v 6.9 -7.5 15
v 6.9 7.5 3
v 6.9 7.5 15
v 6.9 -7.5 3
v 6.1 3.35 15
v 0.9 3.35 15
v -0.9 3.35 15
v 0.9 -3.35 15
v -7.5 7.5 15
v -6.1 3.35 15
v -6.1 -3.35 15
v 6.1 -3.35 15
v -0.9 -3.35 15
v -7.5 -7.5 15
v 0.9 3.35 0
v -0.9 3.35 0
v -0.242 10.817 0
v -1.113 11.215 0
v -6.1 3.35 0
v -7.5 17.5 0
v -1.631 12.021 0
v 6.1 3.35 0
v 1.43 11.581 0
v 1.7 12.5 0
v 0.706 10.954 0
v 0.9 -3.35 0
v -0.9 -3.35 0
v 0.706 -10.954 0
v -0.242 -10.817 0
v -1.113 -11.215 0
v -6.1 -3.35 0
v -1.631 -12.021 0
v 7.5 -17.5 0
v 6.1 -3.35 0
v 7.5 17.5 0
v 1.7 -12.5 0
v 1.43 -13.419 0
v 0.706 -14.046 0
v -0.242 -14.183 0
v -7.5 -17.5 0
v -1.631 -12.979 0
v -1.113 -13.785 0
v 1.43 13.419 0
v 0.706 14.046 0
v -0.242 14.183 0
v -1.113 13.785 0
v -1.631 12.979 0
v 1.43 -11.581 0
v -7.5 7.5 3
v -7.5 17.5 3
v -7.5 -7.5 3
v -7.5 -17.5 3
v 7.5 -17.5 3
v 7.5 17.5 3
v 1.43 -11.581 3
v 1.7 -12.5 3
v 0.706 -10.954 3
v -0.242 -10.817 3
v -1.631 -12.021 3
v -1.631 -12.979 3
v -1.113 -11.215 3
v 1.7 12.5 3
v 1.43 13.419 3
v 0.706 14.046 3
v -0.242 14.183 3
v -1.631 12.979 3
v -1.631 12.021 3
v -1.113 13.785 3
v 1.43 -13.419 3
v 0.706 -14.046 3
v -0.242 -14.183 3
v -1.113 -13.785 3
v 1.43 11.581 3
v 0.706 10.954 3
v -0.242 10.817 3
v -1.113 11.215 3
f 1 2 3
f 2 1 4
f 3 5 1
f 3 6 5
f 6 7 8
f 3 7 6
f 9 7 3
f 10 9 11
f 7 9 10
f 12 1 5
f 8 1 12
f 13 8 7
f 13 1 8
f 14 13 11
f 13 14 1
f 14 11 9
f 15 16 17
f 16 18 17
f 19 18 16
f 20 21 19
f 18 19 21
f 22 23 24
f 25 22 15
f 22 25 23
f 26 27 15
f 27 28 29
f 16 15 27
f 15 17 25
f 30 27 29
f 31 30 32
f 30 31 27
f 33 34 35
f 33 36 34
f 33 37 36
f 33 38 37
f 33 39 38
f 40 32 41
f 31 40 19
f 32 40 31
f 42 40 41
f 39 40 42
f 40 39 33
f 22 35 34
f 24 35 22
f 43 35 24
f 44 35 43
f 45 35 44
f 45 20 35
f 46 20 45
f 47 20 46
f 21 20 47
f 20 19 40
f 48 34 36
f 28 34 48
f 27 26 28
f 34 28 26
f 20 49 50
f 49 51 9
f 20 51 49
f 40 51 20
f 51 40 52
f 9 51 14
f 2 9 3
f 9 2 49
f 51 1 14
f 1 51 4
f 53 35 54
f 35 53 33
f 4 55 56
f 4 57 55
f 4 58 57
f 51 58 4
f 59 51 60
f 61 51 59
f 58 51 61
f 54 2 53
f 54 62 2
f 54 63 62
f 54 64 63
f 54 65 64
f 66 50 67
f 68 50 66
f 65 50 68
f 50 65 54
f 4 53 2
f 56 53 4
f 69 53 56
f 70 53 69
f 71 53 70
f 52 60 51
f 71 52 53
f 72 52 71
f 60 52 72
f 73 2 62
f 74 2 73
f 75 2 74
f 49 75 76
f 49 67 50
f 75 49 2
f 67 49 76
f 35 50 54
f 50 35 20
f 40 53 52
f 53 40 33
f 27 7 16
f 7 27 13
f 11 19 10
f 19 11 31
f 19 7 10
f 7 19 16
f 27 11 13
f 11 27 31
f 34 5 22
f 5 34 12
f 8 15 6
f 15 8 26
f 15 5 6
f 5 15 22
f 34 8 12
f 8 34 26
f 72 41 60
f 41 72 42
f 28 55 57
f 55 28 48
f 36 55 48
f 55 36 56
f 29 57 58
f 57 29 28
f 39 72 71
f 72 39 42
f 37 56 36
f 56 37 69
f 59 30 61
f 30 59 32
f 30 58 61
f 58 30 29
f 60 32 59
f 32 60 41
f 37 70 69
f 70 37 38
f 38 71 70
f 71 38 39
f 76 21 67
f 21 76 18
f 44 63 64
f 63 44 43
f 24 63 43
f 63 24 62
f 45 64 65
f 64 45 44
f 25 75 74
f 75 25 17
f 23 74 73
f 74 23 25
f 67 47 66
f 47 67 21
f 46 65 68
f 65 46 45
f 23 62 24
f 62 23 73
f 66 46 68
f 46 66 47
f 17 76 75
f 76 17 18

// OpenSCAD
// file: holder.scad
include <config.scad>

holder_base_w=25;
holder_base_h=20;
holder_cylinder_d=23.3;
holder_cylinder_h=6+5+2+5+2;

module holder(){
    holder1();
    translate([0,0,holder_base_h+holder_cylinder_h-6])
        holder2();
    translate([0,0,holder_base_h+holder_cylinder_h-2-6-5])    
        holder3();
}

module holder1(){
    difference(){
        union(){
            //base
            translate([-holder_base_w/2,-holder_base_w/2,0])
                cube([holder_base_w,holder_base_w,holder_base_h]);
            
            //cylinder
            translate([0,0,holder_base_h-1])
                cylinder(h=holder_cylinder_h+1,d=holder_cylinder_d);
            //cylinder2
            translate([0,0,holder_base_h-1])
                cylinder(h=2+1,d=25);
        }   
        //motor hole
        translate([0,0,-1])
            cylinder(h=holder_base_h+holder_cylinder_h+2,d=5+play);
        for(r=[-90,30,150])
        rotate([0,0,r+90])        
        translate([0,0,holder_base_h+holder_cylinder_h-3])
        rotate([0,90,0]){        
            translate([0,0,0])
                cylinder(h=holder_base_h+holder_cylinder_h+2,d=3.2+play);
            translate([0,0,4]){
                rotate([0,0,30])
                    cylinder(h=M3_nut_h,r=M3_nut_d/2,$fn=6);        
                translate([-5,-M3_nut_d/2,0])
                    cube([5,M3_nut_d,M3_nut_h]);        
            }
        }

        //cable holes
        translate([-holder_cylinder_d/2,0,holder_base_h-3+1])
            cylinder(h=holder_cylinder_h+4,r=3);
        translate([-holder_cylinder_d/2+3,0,holder_base_h-3])
        rotate([0,-90,0])        
            cylinder(h=holder_base_w/2,r=3);
           

        //holes
        holes_w=15.24;
        for(dx=[-1,1])
        for(dy=[-1,1])
        translate([dx*holes_w/2,dy*holes_w/2,0]){
            translate([0,0,-1])
                cylinder(h=holder_base_h+2,d=3.2+play);
            translate([0,0,holder_base_h/2-M3_nut_h/2]){
                rotate([0,0,30])
                    cylinder(h=M3_nut_h,r=M3_nut_d/2,$fn=6);        
                translate([holder_base_w*(dx-1)/2,-M3_nut_d/2,0])
                    cube([holder_base_w,M3_nut_d,M3_nut_h]);        
            }
        }

    }
}
module holder2(){
  difference(){
     cylinder(h=6,d=27);
      
     translate([0,0,-1])
        cylinder(h=8+2,d=holder_cylinder_d+play);
    for(r=[-90,30,150])
    rotate([0,0,r+90])        
    translate([0,0,3])
    rotate([0,90,0])      
        translate([0,0,0])
            cylinder(h=holder_base_h+holder_cylinder_h+2,d=3.2+play);
  }
}
module holder3(){
  difference(){
     cylinder(h=2,d=27);
      
    translate([0,0,-1])
        cylinder(h=2+2,d=holder_cylinder_d+play);


  }
}

holder();
//holder1();
//holder2();
//holder3();
// file: config.scad
//General Settings
play=0.2; //to make fittings (add to some holes if nessesary)
//circle resolution 
$fa = 3;
$fs = 1;//0.5;

aluminum = [0.9, 0.9, 0.9];
steel = [0.8, 0.8, 0.9];
wood="BurlyWood";

//ISO/DIN Parts 
//Kugellager
kugellager_d=5+play;
kugellager_h=2.5+play;

//Mutter M2
M2_nut_d=4.38+2*play;
M2_nut_w=4+2*play;
M2_nut_h=1.6+2*play;

//Mutter M3
M3_nut_d=6.01+2*play;
M3_nut_w=5.5+2*play;
M3_nut_h=2.4+2*play;

//Mutter M4
M4_nut_d=7.66+2*play;
M4_nut_w=7+2*play;
M4_nut_h=3.2+2*play;

//Mutter M5
M5_nut_d=9.23+2*play;
M5_nut_w=8+2*play;
M5_nut_h=4+2*play;


//Mutter M8
M8_nut_d=14.38+2*play;
M8_nut_w=13+2*play;
M8_nut_h=6.8+2*play;

//LMXXUU Linear Ball Bearing
LMXXUU_d=19;
LMXXUU_l=29;

//Pully 2.5
band_w=5;
band_b=2;
band_outer_d=13;
//Ballbearing opposit for pully
band_bb_id=5;
band_bb_od=11;
band_bb_w=4;

//Bearing
B608Z_od=22+2*play;
B608Z_id=8+2*play;
B608Z_isd=13;
B608Z_h=7;

//Nema17
nema17_od=42.3;
nema17_id=22+2*play;
nema17_screw_d=31;
nema17_l=48;

//Nema17
nema23_id=38.1+2*play;
nema23_screw_d=47.14;
// main file
include <config.scad>

use <holder.scad>

brush_holder_d=51;

module debug(){
    translate([0,brush_holder_d,0])
    rotate([180,0,0])
    translate([0,0,-40-2])
        holder();
        

    for(i=[0,brush_holder_d])
    translate([0,i,-1])
    difference(){
        cube([50,50,2],true);
        for(i=[-1,1])
        translate([0,i*29/2,-2])
            cylinder(h=4,d=4.4);
    }
    //PCB
    translate([0,brush_holder_d,40+2])
    rotate(0){        
        translate([-50,-50,0])        
            cube([100,100,1.6]);
        translate([-5/2,-2/2-46,-27])        
            cube([5,2,27]);
    }
}

module brush(){
    brush1();
    translate([0,brush_holder_d-15-26/2-2,14])
    rotate([-90,90,0])
        brush2();
}

module brush1(){
    difference(){
        union(){
            translate([-35/2,brush_holder_d-15-26/2-2-5,0])
                cube([35,5,21.5]);
            translate([0,brush_holder_d-15-26/2-2,0])
            intersection(){                
                translate([-12/2,-15,0])
                    cube([12,15,21.5]);
                translate([0,0,0])
                    cylinder(h=21.5,d=29);
            }
            translate([-35/2,5,0])
                cube([35,15,5]);
            translate([-15/2,-35/2,0])
                cube([15,35,5]);
        }
        
        for(i=[-1,1])
        translate([0,i*29/2,0]){
            translate([0,0,5-2])
                cylinder(h=M3_nut_h,r=M3_nut_d/2,$fn=6);        
            translate([0,0,-1])
                cylinder(h=10+2,d=3.2+play);
        }        
        translate([-M3_nut_d/2,29/2,3])
            cube([M3_nut_d,10,M3_nut_h]);       
        translate([0,brush_holder_d-15-26/2-2,14]){
            translate([0,-1,0])
            difference(){
                union(){                
                    for(i=[-1,1]) 
                    translate([0,0,i*(5+2)/2])
                    rotate([-90,0,0])
                        cylinder(h=2,d=10);
                    for(i=[0,180]) 
                    rotate([i,0,0])
                    translate([0,0,3])
                        cylinder(h=6,d=3);
                }
                translate([-10/2,-1,-1/2])
                    cube([10,4,1]);
            }
            for(i=[-1,1]) 
            translate([i*25/2,-8,0])
                rotate([-90,0,0])
                {
                    cylinder(h=10,d=3.2+play);
                    translate([0,0,2])
                        cylinder(h=M3_nut_h,r=M3_nut_d/2,$fn=6);        
                }
        }
        translate([0,6,21.5-10/2-1])
        rotate([-90,0,0])
            cylinder(h=3,d=10+2*play);        
    }
}

module brush2(){
    difference(){
        union(){
            translate([-15/2,-15/2,0])
                cube([14.4,15,15]);
            translate([-15/2,-35/2,0])
                cube([15,35,3]);
        }
        for(i=[-1,1])
        translate([i*(5+2)/2,0,+15/2])
            cube([4.8+2*play,6.3+2*play,15+2],center=true);
        
        for(i=[-1,1])
        translate([0,i*25/2,-1])
            cylinder(h=20+2,d=3.2+play);        
    }
}


//debug();

//brush();
//brush1();
brush2();
